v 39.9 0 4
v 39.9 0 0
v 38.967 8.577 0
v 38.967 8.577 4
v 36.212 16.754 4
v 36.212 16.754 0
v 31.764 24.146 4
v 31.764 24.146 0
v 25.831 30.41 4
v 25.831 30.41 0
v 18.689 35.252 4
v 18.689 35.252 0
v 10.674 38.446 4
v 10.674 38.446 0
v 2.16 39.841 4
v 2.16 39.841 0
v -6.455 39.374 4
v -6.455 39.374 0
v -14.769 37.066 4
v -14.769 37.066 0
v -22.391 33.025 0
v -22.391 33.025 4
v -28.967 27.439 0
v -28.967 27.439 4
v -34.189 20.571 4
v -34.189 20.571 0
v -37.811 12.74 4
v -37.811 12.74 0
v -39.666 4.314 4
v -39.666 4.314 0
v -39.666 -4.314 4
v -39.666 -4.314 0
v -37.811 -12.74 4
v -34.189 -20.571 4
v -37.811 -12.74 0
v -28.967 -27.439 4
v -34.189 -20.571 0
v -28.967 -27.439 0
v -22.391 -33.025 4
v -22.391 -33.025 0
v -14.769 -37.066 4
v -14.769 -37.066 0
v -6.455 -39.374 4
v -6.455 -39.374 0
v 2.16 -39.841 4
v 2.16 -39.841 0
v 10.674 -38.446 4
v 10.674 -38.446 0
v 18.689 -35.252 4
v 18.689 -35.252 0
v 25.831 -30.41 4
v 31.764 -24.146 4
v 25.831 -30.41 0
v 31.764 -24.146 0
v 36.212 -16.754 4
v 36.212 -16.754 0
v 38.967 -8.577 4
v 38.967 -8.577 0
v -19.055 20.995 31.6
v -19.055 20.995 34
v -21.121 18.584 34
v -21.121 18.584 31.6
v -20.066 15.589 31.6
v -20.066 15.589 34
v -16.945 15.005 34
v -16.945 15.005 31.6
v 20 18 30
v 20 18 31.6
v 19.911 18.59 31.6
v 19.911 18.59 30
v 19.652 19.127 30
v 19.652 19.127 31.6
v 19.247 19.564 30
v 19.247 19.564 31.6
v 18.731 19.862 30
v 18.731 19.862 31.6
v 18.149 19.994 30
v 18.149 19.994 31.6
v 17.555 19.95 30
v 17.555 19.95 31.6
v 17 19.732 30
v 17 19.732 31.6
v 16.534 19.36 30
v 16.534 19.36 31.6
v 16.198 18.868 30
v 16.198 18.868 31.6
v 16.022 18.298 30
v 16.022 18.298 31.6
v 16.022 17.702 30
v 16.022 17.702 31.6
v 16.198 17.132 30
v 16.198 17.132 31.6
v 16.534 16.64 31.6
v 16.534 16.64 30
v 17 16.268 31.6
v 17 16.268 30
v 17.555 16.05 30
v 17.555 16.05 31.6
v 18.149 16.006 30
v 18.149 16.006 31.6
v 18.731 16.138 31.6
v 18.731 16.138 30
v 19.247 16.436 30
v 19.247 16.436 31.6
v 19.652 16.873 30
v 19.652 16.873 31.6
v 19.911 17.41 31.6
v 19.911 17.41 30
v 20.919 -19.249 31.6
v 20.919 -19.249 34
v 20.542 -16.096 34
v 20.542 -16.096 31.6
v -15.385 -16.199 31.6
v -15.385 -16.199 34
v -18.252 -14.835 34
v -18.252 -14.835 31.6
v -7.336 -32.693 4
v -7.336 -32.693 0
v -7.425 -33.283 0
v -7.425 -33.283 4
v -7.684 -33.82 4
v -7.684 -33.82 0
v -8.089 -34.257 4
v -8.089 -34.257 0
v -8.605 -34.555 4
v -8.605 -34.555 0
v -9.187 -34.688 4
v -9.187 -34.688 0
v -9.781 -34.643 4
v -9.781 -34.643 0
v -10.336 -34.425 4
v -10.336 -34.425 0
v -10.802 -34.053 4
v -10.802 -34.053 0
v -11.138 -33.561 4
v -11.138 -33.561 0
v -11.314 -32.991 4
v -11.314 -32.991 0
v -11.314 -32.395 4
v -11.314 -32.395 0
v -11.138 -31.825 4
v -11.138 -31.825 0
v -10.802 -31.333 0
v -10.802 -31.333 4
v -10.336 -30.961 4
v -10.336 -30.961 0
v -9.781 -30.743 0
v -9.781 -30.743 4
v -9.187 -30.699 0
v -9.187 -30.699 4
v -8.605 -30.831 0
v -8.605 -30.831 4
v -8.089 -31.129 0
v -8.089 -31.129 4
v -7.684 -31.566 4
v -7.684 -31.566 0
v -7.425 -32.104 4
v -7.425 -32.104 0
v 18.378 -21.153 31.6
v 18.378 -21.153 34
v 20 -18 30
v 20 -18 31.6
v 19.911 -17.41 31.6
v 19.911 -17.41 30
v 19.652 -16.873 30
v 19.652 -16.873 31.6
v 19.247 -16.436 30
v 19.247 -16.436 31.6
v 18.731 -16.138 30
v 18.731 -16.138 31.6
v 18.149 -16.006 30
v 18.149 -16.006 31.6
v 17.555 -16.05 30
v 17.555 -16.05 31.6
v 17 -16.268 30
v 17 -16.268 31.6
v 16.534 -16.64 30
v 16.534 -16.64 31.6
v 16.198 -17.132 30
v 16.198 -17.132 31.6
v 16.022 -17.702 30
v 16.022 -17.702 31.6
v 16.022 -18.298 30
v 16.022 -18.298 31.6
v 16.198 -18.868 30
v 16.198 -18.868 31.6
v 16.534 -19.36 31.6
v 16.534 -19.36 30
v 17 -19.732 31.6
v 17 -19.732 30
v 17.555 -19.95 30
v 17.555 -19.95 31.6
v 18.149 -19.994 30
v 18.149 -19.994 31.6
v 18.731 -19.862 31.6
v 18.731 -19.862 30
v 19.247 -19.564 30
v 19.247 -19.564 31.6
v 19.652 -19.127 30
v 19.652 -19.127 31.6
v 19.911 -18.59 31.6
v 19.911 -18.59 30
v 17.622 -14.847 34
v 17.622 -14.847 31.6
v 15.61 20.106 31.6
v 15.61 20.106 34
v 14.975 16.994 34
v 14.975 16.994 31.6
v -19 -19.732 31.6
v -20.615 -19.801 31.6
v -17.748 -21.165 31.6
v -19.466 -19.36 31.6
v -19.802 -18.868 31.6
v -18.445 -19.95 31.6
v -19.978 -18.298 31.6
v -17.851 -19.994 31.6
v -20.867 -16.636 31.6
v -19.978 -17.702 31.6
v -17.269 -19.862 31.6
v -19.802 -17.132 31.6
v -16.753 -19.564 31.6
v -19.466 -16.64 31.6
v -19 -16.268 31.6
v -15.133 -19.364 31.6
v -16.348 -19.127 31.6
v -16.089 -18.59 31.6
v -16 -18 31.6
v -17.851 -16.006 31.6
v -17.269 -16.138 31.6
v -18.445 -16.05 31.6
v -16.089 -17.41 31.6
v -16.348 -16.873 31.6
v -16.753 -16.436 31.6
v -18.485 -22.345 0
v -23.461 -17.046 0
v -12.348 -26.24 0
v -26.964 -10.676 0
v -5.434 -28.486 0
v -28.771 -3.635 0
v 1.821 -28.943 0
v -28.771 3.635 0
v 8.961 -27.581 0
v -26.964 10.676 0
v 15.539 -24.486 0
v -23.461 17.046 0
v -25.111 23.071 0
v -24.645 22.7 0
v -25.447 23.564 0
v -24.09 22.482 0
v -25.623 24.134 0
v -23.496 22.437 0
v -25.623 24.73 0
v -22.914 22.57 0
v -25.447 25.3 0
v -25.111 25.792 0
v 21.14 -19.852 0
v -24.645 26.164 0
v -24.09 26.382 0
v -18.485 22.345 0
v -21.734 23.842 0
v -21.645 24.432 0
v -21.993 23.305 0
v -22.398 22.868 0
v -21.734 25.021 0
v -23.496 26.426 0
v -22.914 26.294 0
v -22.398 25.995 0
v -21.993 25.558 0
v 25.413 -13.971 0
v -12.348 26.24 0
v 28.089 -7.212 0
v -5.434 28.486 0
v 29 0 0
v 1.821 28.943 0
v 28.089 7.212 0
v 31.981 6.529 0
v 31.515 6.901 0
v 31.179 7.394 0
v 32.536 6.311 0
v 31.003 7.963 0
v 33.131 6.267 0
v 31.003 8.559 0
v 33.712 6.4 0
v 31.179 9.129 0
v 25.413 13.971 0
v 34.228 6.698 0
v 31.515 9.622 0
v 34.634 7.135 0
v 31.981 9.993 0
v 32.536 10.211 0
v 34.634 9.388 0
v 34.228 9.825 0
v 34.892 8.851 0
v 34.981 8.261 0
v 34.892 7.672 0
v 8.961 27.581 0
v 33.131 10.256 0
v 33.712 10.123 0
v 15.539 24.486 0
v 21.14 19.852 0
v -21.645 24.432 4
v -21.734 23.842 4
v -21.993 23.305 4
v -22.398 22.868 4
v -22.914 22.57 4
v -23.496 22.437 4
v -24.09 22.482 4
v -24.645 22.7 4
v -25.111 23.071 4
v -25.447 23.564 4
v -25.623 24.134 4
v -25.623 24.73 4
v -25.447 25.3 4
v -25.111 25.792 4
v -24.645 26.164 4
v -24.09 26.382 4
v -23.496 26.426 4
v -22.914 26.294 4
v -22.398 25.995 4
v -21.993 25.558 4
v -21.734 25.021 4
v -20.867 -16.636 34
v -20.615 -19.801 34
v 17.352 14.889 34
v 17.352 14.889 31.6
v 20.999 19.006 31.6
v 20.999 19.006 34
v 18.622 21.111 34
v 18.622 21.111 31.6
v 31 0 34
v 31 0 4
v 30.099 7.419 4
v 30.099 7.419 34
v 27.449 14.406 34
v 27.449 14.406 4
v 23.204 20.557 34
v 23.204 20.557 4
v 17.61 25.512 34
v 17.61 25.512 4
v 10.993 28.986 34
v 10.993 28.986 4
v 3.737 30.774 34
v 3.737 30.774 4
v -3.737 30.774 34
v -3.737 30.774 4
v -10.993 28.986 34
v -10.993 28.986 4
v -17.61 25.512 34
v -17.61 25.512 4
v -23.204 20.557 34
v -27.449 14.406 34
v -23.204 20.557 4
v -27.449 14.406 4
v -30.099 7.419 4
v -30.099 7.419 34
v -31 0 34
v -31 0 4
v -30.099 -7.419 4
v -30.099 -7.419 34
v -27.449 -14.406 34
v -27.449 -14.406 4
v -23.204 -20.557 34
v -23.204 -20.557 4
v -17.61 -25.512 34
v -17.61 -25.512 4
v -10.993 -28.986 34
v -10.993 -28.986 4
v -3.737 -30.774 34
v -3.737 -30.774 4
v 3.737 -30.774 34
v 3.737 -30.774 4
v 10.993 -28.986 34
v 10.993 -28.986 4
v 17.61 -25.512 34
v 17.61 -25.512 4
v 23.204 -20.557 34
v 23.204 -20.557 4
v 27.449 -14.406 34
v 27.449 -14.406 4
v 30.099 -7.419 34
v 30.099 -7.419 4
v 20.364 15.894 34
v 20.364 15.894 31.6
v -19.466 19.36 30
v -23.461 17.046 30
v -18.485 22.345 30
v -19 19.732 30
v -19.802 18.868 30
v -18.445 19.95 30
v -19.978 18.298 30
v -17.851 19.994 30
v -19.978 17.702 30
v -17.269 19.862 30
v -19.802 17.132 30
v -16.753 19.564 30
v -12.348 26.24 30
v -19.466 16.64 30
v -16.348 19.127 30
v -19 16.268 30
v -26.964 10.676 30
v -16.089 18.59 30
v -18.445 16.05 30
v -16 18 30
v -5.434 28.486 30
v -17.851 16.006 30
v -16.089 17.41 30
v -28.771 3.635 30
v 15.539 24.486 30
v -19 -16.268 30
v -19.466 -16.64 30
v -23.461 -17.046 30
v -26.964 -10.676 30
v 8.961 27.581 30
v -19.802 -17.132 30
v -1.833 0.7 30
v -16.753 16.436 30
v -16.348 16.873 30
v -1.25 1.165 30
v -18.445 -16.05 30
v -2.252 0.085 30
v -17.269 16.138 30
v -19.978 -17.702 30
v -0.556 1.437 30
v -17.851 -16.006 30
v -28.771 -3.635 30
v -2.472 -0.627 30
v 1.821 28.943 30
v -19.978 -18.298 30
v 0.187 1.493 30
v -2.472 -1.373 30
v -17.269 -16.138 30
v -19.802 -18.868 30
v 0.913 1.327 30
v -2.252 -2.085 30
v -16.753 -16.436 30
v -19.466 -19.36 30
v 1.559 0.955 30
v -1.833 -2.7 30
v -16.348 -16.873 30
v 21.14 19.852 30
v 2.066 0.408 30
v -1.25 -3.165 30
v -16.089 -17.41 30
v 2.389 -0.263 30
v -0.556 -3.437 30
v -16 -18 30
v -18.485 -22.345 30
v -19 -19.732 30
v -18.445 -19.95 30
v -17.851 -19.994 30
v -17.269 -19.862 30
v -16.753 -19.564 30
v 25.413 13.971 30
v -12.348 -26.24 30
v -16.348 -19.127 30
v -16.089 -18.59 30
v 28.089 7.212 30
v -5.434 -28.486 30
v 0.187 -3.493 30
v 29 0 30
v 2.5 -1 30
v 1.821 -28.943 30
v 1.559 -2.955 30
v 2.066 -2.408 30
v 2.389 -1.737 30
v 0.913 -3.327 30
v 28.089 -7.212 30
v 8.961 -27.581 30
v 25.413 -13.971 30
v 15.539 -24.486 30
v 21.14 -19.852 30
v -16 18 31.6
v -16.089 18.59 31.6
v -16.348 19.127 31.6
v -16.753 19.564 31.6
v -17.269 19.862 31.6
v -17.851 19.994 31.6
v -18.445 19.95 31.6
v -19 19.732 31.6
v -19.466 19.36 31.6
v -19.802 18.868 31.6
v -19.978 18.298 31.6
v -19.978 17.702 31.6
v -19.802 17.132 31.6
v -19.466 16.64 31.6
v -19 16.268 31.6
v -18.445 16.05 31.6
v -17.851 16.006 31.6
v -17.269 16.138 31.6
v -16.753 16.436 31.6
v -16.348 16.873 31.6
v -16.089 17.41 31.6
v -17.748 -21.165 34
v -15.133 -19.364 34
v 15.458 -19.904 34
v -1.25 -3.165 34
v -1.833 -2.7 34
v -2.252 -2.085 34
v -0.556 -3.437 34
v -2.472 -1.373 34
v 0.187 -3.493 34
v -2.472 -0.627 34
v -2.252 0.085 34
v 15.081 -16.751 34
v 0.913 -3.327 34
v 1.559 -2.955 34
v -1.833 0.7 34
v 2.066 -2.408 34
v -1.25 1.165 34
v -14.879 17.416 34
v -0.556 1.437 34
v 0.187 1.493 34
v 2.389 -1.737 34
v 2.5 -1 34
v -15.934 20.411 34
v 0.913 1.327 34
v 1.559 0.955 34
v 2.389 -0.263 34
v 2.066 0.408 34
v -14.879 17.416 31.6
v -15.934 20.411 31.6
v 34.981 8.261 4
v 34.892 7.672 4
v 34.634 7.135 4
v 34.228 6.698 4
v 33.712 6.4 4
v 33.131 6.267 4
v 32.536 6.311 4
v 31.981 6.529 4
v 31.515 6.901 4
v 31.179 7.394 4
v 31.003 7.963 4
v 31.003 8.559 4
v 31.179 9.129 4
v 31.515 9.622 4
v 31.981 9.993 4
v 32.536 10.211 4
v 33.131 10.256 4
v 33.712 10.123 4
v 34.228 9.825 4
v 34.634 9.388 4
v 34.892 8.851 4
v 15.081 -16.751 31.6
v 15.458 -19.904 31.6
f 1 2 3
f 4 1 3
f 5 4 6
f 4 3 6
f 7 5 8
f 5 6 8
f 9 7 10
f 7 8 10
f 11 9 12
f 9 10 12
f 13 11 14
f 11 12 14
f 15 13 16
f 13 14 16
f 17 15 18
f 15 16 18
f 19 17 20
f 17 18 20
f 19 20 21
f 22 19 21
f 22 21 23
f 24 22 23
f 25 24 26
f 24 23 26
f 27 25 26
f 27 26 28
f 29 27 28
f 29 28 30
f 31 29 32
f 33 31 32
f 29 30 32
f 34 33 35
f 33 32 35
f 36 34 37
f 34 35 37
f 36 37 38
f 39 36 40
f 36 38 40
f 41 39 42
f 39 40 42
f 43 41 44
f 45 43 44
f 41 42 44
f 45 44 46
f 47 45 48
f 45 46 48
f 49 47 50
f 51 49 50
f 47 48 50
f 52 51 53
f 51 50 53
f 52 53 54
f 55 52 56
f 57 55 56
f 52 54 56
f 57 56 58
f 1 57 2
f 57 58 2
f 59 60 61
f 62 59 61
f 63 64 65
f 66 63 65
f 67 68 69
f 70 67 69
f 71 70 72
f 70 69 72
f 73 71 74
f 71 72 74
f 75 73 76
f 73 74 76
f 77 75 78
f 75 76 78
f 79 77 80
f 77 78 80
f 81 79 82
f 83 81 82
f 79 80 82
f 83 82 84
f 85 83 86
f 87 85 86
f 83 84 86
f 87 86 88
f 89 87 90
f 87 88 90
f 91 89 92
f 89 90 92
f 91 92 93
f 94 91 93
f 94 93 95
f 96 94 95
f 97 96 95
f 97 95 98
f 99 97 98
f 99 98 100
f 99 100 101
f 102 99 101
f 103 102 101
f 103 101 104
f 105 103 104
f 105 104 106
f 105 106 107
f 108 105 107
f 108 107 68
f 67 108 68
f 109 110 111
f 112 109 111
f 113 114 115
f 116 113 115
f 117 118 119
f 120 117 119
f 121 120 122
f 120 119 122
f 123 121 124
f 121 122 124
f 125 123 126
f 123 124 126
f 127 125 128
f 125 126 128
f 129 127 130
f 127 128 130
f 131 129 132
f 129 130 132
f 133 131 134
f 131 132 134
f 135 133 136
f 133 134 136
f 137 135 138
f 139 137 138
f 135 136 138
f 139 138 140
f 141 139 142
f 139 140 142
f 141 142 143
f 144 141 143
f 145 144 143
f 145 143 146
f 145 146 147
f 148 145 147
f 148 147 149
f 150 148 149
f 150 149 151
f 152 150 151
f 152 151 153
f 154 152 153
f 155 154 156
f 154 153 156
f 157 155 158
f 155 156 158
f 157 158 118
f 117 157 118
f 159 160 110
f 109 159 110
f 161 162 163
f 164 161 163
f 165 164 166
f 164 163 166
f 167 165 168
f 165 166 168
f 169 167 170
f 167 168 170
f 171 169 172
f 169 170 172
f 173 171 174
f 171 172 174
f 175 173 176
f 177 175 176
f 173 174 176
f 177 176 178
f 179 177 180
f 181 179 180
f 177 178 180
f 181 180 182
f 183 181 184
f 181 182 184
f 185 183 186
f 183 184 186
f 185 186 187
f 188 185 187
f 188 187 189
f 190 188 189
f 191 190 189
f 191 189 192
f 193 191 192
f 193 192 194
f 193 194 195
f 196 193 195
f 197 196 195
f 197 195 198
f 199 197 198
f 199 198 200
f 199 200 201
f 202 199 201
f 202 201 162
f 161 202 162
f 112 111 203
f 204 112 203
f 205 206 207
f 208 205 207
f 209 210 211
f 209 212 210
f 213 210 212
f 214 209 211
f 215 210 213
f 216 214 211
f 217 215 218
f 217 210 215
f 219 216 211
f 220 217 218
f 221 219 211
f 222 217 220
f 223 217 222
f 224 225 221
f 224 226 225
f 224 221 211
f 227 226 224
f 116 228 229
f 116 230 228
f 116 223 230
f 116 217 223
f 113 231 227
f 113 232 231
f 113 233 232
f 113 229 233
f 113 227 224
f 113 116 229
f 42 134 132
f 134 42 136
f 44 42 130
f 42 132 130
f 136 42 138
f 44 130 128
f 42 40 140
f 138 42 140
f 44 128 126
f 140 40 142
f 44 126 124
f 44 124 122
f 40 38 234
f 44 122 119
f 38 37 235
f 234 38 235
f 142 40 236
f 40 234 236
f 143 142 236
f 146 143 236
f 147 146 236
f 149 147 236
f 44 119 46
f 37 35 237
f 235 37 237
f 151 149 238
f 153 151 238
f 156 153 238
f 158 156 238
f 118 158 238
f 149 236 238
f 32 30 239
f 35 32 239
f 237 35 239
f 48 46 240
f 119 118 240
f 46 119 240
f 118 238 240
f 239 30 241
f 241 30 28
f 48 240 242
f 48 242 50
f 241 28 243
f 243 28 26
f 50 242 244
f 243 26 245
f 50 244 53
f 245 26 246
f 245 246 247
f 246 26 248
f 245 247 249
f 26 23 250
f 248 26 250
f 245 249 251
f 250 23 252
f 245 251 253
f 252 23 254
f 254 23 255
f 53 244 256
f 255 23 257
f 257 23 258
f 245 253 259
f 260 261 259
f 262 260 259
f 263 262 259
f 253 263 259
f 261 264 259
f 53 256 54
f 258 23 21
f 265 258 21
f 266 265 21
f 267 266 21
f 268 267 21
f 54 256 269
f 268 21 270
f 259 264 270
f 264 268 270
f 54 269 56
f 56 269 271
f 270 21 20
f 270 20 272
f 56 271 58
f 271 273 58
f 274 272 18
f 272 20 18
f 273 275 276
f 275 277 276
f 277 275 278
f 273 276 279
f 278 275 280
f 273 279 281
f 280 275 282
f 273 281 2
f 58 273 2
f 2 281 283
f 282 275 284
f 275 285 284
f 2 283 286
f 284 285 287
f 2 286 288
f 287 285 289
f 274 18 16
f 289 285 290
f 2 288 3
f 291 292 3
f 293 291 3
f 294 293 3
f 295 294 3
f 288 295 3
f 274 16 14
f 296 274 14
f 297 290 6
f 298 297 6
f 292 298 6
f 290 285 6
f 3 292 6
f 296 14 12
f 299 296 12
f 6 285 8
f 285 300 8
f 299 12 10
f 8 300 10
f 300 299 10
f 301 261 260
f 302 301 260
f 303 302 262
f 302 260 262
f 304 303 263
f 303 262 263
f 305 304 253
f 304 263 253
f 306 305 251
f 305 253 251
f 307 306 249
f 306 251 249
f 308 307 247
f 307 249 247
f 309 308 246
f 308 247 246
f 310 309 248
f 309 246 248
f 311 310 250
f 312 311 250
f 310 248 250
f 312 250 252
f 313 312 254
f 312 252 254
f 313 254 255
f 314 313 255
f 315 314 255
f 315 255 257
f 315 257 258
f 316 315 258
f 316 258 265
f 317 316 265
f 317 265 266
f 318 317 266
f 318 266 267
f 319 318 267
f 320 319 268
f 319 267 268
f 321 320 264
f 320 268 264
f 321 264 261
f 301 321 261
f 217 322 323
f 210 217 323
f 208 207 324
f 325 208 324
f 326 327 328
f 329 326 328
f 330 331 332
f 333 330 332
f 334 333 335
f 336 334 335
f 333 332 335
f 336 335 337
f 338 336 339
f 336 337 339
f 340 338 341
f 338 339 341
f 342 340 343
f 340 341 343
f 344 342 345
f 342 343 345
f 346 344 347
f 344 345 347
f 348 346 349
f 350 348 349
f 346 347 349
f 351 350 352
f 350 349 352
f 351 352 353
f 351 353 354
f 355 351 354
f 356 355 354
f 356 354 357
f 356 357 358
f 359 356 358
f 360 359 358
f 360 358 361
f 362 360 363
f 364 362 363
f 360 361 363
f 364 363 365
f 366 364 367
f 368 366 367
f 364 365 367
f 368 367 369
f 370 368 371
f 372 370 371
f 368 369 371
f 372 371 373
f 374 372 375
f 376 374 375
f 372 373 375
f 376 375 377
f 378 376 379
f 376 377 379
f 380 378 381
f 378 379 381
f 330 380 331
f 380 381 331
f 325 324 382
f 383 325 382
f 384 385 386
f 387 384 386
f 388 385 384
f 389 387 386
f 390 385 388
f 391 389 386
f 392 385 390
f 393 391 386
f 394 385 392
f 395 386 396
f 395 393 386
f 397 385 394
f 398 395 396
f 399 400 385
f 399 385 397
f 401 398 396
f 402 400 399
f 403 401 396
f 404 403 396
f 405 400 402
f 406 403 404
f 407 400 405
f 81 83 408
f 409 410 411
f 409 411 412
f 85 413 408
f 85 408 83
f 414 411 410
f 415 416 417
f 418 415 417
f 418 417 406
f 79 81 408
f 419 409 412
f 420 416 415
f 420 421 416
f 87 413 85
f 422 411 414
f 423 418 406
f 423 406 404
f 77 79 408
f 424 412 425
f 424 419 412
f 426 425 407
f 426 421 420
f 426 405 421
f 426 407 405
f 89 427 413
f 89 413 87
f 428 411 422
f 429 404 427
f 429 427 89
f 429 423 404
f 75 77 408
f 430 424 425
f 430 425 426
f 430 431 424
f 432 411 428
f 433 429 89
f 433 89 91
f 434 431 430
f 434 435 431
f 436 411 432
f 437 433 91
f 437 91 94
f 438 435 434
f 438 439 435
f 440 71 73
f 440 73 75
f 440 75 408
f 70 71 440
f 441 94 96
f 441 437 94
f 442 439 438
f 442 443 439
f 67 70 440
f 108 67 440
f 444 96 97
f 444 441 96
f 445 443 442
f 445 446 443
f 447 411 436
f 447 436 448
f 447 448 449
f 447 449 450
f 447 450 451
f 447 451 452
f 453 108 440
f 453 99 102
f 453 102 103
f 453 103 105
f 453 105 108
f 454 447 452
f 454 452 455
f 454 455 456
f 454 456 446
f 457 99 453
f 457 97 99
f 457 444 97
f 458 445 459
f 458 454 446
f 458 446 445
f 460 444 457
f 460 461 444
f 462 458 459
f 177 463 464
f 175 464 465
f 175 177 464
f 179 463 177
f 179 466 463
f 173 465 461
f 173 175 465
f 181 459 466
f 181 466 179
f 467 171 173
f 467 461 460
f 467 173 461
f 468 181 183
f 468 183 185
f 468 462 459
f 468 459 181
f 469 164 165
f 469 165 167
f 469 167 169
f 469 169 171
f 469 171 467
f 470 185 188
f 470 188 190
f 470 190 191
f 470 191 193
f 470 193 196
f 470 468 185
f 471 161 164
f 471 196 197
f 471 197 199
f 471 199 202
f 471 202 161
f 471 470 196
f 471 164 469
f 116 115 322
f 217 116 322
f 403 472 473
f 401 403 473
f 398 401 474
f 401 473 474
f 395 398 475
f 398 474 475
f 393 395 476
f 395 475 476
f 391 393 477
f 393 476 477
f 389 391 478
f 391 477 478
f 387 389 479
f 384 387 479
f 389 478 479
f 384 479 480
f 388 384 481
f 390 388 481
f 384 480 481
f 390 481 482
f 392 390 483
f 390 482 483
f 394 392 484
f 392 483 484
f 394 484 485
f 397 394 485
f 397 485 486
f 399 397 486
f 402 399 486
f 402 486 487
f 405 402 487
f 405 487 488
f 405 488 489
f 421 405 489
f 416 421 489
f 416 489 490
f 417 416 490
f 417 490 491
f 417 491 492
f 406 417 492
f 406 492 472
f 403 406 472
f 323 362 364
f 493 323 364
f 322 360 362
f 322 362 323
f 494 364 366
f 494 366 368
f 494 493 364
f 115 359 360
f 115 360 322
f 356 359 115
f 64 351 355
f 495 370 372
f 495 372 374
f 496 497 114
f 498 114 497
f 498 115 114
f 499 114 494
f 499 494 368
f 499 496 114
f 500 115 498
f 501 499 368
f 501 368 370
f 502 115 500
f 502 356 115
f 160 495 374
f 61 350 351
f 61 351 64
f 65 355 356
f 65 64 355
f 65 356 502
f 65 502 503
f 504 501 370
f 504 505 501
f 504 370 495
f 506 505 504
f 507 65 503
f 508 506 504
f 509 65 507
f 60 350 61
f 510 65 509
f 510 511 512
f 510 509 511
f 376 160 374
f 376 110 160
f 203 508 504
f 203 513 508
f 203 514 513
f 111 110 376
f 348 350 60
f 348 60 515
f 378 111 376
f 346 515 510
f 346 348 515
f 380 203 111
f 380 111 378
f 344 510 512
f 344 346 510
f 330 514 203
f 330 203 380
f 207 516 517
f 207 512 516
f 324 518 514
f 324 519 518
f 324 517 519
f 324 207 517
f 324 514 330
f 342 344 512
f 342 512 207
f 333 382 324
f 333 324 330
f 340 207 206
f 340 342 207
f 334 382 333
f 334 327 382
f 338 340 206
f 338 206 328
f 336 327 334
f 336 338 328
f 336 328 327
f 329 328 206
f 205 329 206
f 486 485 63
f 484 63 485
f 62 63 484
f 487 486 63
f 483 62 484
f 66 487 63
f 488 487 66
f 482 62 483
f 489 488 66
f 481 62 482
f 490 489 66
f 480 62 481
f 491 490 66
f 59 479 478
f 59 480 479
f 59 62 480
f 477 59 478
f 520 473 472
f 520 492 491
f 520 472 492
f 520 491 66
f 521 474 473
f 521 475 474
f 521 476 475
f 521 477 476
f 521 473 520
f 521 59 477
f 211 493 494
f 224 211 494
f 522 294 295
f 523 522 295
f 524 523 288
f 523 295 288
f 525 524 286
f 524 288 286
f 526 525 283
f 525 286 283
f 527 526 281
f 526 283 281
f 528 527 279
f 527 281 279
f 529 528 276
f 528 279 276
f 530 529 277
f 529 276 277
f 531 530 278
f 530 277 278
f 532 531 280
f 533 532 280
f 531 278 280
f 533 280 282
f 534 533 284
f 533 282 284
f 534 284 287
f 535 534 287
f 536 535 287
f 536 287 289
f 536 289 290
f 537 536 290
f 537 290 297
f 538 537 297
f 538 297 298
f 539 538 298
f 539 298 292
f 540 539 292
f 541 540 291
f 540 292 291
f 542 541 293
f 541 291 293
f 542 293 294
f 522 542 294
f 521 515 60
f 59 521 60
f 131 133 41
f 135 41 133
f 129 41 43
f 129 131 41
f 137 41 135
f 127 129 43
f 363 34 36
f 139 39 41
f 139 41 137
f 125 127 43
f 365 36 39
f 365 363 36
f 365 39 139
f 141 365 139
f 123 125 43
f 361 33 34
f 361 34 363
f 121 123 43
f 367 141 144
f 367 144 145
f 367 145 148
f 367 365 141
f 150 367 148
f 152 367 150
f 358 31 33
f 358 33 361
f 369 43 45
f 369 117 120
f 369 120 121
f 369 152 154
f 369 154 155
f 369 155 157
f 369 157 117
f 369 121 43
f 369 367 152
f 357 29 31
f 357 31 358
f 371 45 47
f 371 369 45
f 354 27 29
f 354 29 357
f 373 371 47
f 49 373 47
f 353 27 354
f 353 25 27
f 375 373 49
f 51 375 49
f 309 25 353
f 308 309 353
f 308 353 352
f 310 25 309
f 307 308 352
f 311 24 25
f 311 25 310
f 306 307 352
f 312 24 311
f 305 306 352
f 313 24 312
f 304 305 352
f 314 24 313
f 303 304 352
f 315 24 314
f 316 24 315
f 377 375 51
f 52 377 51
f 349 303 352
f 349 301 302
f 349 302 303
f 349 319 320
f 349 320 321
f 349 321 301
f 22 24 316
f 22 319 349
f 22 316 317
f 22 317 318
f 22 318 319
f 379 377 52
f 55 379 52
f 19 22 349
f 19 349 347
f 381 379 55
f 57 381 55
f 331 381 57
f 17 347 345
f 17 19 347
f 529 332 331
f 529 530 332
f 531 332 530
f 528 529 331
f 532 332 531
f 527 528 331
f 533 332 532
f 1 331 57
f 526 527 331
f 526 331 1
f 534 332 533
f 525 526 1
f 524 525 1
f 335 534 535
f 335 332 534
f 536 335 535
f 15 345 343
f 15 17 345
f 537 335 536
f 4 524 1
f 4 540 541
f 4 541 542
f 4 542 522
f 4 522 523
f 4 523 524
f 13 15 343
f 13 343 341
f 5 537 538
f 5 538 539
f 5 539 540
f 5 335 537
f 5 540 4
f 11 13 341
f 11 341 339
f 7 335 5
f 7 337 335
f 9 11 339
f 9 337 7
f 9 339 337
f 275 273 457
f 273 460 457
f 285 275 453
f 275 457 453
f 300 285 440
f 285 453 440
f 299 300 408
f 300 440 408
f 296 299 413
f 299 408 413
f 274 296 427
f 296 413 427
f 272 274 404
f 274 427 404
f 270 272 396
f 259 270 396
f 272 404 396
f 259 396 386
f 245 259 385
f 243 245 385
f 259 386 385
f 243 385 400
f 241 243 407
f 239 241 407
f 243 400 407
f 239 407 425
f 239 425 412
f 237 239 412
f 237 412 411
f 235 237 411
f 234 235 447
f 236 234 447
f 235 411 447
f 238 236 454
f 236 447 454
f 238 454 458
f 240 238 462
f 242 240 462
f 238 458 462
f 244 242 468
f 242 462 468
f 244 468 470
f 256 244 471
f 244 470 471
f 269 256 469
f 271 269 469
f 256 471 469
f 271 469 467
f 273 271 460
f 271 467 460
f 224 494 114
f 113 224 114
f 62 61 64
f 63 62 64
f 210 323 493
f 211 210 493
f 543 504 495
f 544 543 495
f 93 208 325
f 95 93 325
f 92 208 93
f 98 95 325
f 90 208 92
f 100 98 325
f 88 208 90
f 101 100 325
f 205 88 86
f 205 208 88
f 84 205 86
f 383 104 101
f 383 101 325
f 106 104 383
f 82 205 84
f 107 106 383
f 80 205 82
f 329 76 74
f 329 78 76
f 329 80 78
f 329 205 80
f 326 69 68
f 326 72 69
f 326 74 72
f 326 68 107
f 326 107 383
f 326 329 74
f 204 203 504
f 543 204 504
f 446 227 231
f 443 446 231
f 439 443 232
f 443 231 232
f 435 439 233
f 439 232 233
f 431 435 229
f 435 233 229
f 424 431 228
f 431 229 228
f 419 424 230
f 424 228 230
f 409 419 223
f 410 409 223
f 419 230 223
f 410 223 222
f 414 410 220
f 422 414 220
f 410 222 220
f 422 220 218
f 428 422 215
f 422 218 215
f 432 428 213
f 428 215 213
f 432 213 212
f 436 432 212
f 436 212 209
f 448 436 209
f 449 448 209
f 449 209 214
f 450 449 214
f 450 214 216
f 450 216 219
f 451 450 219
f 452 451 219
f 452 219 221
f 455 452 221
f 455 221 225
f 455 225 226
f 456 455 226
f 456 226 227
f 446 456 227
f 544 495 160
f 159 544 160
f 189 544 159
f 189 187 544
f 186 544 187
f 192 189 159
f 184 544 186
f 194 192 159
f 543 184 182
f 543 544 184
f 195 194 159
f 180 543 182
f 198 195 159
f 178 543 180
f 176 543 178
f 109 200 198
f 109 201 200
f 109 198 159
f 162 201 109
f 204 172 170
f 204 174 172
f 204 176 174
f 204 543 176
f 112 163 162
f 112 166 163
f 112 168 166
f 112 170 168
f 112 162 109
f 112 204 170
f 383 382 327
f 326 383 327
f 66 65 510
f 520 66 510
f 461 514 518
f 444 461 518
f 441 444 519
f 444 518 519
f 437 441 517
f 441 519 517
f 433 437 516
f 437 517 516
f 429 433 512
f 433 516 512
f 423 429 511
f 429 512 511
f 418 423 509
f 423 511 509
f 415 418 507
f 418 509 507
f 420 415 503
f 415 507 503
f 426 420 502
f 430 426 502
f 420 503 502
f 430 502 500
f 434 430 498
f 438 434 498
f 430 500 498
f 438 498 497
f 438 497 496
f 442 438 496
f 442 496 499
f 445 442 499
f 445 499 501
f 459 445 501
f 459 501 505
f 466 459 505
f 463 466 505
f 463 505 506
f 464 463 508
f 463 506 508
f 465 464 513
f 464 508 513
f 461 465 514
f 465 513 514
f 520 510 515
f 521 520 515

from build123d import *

# Parameters (mm, degrees)
F0_R      = 39.9
F1_DEPTH  = 4
F2_R      = 29
F3_DEPTH  = 4
F4_R      = 31
F5_DEPTH  = 30
F5_FACE_R = 29
F6_DEPTH  = 26
F8_R      = 2
F9_DEPTH  = 4
F11_R     = 2
F12_DEPTH = 4
F13_R     = 2.5
F14_DEPTH = 4
F16_DEPTH = 2.4


with BuildPart() as f1:
    # F0 (on Top) → F1 (new body)
    with BuildSketch(Plane.XY):
        Circle(F0_R)
    extrude(amount=F1_DEPTH)

    # F2 (on face) → F3 (cut)
    with BuildSketch(Plane.XY.offset(4)):
        Circle(F2_R)
    extrude(amount=-F3_DEPTH, mode=Mode.SUBTRACT)

    # F4 (on face) → F5 (join)
    with BuildSketch(Plane.XY.offset(4)):
        Circle(F4_R)
    extrude(amount=F5_DEPTH)

    # F5_face (on face) → F6 (cut)
    with BuildSketch(Plane(origin=(0, 0, 4), x_dir=(1, 0, 0), z_dir=(0, 0, -1))):
        Circle(F5_FACE_R)
    extrude(amount=-F6_DEPTH, mode=Mode.SUBTRACT)

    # F8 (on face) → F9 (cut)
    with BuildSketch(Plane(origin=(0, 0, 0), x_dir=(1, 0, 0), z_dir=(0, 0, -1))):
        with Locations((-23.645058, -24.431767)):
            Circle(F8_R)
        with Locations((-9.336002, 32.693104)):
            Circle(F8_R)
        with Locations((32.98106, -8.261338)):
            Circle(F8_R)
    extrude(amount=-F9_DEPTH, mode=Mode.SUBTRACT)

    # F11 (on face) → F12 (cut)
    with BuildSketch(Plane.XY.offset(34)):
        with Locations((18, 18)):
            Circle(F11_R)
        with Locations((-18, 18)):
            Circle(F11_R)
        with Locations((-18, -18)):
            Circle(F11_R)
        with Locations((18, -18)):
            Circle(F11_R)
    extrude(amount=-F12_DEPTH, mode=Mode.SUBTRACT)

    # F13 (on face) → F14 (cut)
    with BuildSketch(Plane.XY.offset(34)):
        with Locations((0, -1)):
            Circle(F13_R)
    extrude(amount=-F14_DEPTH, mode=Mode.SUBTRACT)

    # F15 (on face) → F16 (cut)
    with BuildSketch(Plane.XY.offset(34)):
        Polygon((15.45842, -19.903603), (18.377779, -21.152874), (20.919359, -19.249271), (20.54158, -16.096397), (17.622221, -14.847126), (15.080641, -16.750729), align=None)
        Polygon((-20.61525, -19.801056), (-17.747865, -21.165401), (-15.132615, -19.364345), (-15.38475, -16.198944), (-18.252135, -14.834599), (-20.867385, -16.635655), align=None)
        Polygon((14.975065, 16.994466), (17.35189, 14.888751), (20.363905, 15.894285), (20.999095, 19.005534), (18.622269, 21.111249), (15.610254, 20.105715), align=None)
        Polygon((-20.066176, 15.588725), (-16.944863, 15.005001), (-14.878686, 17.416276), (-15.933824, 20.411275), (-19.055137, 20.994999), (-21.121314, 18.583724), align=None)
    extrude(amount=-F16_DEPTH, mode=Mode.SUBTRACT)


solid = f1.part
